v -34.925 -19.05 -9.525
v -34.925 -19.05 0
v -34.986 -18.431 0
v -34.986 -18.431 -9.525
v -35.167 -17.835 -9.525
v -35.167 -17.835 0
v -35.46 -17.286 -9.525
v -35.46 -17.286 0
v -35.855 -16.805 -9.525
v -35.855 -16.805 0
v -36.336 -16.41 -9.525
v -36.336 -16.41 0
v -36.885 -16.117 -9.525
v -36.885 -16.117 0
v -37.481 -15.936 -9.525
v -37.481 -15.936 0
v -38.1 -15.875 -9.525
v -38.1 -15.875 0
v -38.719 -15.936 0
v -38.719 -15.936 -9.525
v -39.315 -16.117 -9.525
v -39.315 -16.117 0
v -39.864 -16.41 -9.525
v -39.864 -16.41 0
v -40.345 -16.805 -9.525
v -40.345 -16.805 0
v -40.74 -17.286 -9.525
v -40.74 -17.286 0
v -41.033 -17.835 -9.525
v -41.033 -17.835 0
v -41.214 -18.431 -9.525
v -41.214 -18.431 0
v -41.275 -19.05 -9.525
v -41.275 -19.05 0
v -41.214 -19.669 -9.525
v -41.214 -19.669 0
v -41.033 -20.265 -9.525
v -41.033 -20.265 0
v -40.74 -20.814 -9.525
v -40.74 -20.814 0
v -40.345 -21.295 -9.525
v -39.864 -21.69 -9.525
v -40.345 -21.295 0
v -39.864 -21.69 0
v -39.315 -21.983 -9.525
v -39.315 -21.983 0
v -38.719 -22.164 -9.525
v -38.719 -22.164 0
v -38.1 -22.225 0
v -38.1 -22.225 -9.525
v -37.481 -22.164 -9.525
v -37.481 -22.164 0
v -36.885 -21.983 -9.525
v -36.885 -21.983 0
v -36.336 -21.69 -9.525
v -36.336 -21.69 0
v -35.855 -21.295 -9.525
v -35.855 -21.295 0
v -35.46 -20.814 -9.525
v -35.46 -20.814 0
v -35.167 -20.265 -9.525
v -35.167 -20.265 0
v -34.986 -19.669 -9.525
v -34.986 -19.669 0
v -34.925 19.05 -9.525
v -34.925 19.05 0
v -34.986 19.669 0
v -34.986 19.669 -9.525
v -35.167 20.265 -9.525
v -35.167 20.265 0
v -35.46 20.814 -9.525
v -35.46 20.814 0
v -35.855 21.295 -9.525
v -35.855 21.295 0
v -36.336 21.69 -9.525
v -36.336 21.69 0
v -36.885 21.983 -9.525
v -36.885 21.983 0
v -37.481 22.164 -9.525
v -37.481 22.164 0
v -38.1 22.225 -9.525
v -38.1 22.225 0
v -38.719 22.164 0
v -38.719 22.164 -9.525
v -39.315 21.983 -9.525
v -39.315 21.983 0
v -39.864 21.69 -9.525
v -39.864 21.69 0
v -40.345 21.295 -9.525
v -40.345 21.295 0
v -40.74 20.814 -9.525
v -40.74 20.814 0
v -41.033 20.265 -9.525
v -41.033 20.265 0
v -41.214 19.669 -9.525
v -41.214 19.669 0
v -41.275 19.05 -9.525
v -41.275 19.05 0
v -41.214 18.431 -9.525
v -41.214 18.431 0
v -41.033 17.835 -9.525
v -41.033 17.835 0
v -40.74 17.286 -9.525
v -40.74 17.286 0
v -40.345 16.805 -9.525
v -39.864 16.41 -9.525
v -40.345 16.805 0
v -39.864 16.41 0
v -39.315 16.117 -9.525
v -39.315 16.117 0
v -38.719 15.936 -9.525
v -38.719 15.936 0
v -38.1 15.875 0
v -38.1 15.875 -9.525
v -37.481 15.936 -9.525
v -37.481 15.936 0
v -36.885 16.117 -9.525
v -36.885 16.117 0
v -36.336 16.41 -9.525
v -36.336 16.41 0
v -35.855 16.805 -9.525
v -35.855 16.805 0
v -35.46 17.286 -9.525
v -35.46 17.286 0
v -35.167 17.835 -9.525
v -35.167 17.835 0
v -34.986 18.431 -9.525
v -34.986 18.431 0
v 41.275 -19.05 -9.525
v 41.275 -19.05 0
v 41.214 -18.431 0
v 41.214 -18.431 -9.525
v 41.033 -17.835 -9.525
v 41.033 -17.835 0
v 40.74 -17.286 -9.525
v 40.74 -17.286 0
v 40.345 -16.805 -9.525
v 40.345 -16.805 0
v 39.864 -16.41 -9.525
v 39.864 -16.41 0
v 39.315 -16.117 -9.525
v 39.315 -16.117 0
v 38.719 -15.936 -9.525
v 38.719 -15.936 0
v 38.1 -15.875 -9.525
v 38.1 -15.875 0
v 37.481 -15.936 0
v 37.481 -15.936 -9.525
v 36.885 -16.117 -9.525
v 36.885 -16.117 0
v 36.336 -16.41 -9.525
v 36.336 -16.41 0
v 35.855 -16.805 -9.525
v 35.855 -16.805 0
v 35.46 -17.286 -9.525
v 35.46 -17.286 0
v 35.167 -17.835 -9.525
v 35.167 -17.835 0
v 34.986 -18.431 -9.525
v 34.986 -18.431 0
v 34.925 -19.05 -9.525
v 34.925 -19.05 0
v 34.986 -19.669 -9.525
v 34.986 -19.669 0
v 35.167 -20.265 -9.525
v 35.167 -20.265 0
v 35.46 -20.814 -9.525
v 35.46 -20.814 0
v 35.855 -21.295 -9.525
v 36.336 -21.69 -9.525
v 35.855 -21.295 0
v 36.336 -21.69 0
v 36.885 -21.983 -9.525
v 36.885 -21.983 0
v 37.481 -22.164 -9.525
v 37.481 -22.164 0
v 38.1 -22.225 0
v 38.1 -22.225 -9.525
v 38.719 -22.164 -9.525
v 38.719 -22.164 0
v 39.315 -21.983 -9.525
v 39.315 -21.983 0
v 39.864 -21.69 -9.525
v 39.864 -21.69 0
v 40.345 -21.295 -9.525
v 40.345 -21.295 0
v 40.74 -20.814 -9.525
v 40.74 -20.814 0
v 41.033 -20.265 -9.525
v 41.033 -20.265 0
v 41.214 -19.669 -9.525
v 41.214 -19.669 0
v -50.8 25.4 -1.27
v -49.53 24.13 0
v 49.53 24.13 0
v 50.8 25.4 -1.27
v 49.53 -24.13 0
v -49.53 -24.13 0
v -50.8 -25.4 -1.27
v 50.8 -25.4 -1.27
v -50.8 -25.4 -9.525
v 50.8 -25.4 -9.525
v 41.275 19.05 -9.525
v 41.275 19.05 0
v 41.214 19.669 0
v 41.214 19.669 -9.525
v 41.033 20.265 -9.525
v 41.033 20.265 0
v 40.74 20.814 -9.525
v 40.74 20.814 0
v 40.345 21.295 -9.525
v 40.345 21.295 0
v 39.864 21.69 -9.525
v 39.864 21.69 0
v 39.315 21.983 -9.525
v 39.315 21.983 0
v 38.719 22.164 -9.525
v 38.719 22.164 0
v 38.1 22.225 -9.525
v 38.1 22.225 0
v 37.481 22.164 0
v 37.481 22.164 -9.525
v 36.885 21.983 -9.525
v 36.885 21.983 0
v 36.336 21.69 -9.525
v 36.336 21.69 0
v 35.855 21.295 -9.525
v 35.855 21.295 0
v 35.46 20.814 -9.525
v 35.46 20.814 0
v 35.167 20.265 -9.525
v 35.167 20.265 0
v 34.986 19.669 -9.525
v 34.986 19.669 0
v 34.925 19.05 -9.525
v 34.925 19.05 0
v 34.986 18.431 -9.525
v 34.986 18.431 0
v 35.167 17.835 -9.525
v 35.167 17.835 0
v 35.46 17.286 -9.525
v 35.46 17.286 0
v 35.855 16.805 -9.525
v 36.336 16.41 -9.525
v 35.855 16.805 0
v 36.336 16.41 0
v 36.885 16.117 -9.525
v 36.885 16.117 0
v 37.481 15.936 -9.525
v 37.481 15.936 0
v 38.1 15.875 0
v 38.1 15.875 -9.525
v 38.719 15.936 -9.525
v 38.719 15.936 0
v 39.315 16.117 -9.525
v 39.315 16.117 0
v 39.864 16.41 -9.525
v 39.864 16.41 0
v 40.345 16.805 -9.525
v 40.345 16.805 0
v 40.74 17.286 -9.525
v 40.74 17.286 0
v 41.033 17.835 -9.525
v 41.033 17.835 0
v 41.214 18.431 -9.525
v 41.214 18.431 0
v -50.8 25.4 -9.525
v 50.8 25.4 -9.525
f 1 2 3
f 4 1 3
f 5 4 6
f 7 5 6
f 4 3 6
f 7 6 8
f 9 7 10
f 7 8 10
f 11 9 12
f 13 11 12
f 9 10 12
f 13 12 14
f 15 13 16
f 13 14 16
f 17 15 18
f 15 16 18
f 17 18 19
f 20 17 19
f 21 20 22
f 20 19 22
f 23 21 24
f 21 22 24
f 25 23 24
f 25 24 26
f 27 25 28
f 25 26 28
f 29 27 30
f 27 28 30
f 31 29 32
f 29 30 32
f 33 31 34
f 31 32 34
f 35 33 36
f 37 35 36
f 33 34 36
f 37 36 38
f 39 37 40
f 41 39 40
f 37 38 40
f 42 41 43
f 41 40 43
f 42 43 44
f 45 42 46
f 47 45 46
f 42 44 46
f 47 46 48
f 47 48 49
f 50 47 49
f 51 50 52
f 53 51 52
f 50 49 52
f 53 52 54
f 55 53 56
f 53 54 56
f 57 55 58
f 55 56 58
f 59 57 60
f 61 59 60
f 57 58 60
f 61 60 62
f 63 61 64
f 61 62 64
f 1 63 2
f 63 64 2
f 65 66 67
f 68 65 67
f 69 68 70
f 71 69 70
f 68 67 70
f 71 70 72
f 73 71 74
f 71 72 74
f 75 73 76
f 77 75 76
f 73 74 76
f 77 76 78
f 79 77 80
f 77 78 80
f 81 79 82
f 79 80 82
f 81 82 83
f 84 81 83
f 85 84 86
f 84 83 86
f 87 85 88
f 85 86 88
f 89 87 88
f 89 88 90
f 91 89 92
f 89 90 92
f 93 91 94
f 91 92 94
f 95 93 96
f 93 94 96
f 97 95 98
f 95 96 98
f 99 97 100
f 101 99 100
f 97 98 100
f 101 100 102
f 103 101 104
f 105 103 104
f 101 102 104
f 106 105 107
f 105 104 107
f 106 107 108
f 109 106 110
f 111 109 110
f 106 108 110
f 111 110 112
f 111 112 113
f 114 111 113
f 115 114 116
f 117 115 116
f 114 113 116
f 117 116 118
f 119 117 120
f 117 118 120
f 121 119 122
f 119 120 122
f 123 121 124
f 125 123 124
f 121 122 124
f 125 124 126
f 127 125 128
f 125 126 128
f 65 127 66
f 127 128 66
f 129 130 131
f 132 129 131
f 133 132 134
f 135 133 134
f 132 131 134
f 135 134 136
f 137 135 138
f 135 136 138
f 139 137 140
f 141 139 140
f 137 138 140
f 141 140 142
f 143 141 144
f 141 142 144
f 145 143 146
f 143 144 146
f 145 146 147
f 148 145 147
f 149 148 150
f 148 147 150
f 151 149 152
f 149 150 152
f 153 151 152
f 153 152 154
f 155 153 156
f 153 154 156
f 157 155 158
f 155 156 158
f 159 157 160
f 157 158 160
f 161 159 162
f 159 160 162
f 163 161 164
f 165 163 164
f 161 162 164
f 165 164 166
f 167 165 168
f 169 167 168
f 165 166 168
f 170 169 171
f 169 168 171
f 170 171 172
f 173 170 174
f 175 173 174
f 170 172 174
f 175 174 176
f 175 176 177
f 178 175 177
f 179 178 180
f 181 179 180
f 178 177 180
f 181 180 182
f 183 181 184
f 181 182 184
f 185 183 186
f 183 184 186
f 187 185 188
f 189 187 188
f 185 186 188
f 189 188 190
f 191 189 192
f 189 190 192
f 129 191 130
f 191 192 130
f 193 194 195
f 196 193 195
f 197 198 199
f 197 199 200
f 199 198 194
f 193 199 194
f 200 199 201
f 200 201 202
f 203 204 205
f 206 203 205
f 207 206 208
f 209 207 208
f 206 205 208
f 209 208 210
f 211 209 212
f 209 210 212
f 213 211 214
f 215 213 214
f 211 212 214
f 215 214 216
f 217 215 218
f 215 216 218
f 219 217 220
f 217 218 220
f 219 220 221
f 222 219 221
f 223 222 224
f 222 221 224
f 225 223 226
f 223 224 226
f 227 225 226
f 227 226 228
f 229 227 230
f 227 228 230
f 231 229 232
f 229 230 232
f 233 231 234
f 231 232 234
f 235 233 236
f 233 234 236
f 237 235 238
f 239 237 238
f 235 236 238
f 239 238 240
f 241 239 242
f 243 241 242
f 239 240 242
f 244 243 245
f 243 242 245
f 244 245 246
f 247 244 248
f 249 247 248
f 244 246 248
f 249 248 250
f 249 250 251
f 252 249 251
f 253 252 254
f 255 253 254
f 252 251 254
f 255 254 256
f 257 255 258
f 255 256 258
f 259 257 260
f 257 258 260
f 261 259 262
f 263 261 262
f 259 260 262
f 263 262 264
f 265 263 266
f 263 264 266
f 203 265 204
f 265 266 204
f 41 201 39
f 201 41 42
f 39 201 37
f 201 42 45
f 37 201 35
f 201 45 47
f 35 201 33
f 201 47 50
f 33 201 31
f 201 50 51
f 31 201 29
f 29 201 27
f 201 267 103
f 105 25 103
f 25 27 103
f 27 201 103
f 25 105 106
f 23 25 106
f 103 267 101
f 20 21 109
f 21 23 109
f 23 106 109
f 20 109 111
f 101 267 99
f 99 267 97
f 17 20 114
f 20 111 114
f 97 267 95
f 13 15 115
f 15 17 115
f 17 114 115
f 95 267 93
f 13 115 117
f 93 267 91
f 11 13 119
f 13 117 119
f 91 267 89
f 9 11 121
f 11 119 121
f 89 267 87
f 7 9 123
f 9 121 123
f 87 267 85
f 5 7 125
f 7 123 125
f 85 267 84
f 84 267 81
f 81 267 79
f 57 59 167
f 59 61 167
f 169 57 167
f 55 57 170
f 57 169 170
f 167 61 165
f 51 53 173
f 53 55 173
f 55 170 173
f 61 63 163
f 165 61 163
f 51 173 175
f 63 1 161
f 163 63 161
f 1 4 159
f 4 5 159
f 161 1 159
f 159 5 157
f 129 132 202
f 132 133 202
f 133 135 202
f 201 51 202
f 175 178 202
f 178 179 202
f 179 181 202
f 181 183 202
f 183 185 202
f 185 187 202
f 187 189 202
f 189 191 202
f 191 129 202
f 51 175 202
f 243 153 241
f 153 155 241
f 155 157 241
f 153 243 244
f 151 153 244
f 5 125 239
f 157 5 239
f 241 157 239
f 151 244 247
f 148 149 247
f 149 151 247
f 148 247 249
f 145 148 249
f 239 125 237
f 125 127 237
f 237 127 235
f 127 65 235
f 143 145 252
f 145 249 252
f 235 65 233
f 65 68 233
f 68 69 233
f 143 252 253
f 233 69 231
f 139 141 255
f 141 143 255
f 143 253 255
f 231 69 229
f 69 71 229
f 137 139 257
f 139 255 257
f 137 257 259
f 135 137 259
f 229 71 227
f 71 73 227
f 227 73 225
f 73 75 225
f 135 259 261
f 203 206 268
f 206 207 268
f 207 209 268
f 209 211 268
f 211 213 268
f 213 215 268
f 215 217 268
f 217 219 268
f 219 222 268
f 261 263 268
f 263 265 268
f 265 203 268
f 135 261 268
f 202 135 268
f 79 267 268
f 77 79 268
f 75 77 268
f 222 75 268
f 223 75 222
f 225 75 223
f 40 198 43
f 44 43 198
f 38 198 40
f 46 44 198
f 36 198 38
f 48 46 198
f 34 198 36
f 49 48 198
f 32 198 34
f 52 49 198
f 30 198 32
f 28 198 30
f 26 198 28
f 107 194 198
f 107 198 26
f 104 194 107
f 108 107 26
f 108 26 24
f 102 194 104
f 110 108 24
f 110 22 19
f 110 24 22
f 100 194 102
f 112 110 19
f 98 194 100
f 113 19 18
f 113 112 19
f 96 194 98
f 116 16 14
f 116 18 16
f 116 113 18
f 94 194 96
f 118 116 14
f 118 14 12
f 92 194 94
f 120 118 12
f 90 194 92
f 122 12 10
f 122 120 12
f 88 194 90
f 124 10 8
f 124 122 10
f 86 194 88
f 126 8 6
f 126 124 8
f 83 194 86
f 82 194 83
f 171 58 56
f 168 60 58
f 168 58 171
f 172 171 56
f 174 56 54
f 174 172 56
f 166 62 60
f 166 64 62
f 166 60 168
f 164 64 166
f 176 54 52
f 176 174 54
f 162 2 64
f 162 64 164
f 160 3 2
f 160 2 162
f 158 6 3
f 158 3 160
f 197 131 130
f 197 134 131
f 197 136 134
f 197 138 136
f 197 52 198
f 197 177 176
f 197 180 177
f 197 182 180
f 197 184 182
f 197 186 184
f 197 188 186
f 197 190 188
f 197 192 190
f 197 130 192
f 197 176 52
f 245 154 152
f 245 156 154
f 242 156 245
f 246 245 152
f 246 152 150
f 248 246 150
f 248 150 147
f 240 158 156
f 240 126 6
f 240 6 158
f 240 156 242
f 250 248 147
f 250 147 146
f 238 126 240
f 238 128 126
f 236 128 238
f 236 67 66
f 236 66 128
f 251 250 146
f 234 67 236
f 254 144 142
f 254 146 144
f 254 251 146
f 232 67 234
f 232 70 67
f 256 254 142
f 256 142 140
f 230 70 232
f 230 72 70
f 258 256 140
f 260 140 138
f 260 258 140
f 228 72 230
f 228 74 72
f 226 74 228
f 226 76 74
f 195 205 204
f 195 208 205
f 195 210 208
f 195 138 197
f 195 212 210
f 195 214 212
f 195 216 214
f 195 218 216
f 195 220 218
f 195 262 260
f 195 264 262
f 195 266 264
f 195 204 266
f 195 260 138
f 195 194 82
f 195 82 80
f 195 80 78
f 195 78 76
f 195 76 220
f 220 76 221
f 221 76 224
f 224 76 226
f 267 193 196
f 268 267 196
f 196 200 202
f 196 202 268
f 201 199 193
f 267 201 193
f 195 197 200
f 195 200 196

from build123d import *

# Parameters (mm, degrees)
F0_W     = 101.6
F0_H     = 50.8
F0_R     = 3.175
F1_DEPTH = 9.525
F2_SIZE2 = 1.27
F2_SIZE  = 1.27


with BuildPart() as f1:
    # F0 (on Top) → F1 (new body)
    with BuildSketch(Plane.XY):
        Rectangle(F0_W, F0_H)
        with Locations((-38.1, -19.05)):
            Circle(F0_R, mode=Mode.SUBTRACT)
        with Locations((38.1, -19.05)):
            Circle(F0_R, mode=Mode.SUBTRACT)
        with Locations((-38.1, 19.05)):
            Circle(F0_R, mode=Mode.SUBTRACT)
        with Locations((38.1, 19.05)):
            Circle(F0_R, mode=Mode.SUBTRACT)
    extrude(amount=-F1_DEPTH)

    # F2
    f2_edges = [f1.edges().sort_by_distance(p)[0] for p in [
        (-50.8, 0, 0),
        (0, -25.4, 0),
        (0, 25.4, 0),
        (50.8, 0, 0),
    ]]
    chamfer(f2_edges, length=F2_SIZE, length2=F2_SIZE2)


solid = f1.part
